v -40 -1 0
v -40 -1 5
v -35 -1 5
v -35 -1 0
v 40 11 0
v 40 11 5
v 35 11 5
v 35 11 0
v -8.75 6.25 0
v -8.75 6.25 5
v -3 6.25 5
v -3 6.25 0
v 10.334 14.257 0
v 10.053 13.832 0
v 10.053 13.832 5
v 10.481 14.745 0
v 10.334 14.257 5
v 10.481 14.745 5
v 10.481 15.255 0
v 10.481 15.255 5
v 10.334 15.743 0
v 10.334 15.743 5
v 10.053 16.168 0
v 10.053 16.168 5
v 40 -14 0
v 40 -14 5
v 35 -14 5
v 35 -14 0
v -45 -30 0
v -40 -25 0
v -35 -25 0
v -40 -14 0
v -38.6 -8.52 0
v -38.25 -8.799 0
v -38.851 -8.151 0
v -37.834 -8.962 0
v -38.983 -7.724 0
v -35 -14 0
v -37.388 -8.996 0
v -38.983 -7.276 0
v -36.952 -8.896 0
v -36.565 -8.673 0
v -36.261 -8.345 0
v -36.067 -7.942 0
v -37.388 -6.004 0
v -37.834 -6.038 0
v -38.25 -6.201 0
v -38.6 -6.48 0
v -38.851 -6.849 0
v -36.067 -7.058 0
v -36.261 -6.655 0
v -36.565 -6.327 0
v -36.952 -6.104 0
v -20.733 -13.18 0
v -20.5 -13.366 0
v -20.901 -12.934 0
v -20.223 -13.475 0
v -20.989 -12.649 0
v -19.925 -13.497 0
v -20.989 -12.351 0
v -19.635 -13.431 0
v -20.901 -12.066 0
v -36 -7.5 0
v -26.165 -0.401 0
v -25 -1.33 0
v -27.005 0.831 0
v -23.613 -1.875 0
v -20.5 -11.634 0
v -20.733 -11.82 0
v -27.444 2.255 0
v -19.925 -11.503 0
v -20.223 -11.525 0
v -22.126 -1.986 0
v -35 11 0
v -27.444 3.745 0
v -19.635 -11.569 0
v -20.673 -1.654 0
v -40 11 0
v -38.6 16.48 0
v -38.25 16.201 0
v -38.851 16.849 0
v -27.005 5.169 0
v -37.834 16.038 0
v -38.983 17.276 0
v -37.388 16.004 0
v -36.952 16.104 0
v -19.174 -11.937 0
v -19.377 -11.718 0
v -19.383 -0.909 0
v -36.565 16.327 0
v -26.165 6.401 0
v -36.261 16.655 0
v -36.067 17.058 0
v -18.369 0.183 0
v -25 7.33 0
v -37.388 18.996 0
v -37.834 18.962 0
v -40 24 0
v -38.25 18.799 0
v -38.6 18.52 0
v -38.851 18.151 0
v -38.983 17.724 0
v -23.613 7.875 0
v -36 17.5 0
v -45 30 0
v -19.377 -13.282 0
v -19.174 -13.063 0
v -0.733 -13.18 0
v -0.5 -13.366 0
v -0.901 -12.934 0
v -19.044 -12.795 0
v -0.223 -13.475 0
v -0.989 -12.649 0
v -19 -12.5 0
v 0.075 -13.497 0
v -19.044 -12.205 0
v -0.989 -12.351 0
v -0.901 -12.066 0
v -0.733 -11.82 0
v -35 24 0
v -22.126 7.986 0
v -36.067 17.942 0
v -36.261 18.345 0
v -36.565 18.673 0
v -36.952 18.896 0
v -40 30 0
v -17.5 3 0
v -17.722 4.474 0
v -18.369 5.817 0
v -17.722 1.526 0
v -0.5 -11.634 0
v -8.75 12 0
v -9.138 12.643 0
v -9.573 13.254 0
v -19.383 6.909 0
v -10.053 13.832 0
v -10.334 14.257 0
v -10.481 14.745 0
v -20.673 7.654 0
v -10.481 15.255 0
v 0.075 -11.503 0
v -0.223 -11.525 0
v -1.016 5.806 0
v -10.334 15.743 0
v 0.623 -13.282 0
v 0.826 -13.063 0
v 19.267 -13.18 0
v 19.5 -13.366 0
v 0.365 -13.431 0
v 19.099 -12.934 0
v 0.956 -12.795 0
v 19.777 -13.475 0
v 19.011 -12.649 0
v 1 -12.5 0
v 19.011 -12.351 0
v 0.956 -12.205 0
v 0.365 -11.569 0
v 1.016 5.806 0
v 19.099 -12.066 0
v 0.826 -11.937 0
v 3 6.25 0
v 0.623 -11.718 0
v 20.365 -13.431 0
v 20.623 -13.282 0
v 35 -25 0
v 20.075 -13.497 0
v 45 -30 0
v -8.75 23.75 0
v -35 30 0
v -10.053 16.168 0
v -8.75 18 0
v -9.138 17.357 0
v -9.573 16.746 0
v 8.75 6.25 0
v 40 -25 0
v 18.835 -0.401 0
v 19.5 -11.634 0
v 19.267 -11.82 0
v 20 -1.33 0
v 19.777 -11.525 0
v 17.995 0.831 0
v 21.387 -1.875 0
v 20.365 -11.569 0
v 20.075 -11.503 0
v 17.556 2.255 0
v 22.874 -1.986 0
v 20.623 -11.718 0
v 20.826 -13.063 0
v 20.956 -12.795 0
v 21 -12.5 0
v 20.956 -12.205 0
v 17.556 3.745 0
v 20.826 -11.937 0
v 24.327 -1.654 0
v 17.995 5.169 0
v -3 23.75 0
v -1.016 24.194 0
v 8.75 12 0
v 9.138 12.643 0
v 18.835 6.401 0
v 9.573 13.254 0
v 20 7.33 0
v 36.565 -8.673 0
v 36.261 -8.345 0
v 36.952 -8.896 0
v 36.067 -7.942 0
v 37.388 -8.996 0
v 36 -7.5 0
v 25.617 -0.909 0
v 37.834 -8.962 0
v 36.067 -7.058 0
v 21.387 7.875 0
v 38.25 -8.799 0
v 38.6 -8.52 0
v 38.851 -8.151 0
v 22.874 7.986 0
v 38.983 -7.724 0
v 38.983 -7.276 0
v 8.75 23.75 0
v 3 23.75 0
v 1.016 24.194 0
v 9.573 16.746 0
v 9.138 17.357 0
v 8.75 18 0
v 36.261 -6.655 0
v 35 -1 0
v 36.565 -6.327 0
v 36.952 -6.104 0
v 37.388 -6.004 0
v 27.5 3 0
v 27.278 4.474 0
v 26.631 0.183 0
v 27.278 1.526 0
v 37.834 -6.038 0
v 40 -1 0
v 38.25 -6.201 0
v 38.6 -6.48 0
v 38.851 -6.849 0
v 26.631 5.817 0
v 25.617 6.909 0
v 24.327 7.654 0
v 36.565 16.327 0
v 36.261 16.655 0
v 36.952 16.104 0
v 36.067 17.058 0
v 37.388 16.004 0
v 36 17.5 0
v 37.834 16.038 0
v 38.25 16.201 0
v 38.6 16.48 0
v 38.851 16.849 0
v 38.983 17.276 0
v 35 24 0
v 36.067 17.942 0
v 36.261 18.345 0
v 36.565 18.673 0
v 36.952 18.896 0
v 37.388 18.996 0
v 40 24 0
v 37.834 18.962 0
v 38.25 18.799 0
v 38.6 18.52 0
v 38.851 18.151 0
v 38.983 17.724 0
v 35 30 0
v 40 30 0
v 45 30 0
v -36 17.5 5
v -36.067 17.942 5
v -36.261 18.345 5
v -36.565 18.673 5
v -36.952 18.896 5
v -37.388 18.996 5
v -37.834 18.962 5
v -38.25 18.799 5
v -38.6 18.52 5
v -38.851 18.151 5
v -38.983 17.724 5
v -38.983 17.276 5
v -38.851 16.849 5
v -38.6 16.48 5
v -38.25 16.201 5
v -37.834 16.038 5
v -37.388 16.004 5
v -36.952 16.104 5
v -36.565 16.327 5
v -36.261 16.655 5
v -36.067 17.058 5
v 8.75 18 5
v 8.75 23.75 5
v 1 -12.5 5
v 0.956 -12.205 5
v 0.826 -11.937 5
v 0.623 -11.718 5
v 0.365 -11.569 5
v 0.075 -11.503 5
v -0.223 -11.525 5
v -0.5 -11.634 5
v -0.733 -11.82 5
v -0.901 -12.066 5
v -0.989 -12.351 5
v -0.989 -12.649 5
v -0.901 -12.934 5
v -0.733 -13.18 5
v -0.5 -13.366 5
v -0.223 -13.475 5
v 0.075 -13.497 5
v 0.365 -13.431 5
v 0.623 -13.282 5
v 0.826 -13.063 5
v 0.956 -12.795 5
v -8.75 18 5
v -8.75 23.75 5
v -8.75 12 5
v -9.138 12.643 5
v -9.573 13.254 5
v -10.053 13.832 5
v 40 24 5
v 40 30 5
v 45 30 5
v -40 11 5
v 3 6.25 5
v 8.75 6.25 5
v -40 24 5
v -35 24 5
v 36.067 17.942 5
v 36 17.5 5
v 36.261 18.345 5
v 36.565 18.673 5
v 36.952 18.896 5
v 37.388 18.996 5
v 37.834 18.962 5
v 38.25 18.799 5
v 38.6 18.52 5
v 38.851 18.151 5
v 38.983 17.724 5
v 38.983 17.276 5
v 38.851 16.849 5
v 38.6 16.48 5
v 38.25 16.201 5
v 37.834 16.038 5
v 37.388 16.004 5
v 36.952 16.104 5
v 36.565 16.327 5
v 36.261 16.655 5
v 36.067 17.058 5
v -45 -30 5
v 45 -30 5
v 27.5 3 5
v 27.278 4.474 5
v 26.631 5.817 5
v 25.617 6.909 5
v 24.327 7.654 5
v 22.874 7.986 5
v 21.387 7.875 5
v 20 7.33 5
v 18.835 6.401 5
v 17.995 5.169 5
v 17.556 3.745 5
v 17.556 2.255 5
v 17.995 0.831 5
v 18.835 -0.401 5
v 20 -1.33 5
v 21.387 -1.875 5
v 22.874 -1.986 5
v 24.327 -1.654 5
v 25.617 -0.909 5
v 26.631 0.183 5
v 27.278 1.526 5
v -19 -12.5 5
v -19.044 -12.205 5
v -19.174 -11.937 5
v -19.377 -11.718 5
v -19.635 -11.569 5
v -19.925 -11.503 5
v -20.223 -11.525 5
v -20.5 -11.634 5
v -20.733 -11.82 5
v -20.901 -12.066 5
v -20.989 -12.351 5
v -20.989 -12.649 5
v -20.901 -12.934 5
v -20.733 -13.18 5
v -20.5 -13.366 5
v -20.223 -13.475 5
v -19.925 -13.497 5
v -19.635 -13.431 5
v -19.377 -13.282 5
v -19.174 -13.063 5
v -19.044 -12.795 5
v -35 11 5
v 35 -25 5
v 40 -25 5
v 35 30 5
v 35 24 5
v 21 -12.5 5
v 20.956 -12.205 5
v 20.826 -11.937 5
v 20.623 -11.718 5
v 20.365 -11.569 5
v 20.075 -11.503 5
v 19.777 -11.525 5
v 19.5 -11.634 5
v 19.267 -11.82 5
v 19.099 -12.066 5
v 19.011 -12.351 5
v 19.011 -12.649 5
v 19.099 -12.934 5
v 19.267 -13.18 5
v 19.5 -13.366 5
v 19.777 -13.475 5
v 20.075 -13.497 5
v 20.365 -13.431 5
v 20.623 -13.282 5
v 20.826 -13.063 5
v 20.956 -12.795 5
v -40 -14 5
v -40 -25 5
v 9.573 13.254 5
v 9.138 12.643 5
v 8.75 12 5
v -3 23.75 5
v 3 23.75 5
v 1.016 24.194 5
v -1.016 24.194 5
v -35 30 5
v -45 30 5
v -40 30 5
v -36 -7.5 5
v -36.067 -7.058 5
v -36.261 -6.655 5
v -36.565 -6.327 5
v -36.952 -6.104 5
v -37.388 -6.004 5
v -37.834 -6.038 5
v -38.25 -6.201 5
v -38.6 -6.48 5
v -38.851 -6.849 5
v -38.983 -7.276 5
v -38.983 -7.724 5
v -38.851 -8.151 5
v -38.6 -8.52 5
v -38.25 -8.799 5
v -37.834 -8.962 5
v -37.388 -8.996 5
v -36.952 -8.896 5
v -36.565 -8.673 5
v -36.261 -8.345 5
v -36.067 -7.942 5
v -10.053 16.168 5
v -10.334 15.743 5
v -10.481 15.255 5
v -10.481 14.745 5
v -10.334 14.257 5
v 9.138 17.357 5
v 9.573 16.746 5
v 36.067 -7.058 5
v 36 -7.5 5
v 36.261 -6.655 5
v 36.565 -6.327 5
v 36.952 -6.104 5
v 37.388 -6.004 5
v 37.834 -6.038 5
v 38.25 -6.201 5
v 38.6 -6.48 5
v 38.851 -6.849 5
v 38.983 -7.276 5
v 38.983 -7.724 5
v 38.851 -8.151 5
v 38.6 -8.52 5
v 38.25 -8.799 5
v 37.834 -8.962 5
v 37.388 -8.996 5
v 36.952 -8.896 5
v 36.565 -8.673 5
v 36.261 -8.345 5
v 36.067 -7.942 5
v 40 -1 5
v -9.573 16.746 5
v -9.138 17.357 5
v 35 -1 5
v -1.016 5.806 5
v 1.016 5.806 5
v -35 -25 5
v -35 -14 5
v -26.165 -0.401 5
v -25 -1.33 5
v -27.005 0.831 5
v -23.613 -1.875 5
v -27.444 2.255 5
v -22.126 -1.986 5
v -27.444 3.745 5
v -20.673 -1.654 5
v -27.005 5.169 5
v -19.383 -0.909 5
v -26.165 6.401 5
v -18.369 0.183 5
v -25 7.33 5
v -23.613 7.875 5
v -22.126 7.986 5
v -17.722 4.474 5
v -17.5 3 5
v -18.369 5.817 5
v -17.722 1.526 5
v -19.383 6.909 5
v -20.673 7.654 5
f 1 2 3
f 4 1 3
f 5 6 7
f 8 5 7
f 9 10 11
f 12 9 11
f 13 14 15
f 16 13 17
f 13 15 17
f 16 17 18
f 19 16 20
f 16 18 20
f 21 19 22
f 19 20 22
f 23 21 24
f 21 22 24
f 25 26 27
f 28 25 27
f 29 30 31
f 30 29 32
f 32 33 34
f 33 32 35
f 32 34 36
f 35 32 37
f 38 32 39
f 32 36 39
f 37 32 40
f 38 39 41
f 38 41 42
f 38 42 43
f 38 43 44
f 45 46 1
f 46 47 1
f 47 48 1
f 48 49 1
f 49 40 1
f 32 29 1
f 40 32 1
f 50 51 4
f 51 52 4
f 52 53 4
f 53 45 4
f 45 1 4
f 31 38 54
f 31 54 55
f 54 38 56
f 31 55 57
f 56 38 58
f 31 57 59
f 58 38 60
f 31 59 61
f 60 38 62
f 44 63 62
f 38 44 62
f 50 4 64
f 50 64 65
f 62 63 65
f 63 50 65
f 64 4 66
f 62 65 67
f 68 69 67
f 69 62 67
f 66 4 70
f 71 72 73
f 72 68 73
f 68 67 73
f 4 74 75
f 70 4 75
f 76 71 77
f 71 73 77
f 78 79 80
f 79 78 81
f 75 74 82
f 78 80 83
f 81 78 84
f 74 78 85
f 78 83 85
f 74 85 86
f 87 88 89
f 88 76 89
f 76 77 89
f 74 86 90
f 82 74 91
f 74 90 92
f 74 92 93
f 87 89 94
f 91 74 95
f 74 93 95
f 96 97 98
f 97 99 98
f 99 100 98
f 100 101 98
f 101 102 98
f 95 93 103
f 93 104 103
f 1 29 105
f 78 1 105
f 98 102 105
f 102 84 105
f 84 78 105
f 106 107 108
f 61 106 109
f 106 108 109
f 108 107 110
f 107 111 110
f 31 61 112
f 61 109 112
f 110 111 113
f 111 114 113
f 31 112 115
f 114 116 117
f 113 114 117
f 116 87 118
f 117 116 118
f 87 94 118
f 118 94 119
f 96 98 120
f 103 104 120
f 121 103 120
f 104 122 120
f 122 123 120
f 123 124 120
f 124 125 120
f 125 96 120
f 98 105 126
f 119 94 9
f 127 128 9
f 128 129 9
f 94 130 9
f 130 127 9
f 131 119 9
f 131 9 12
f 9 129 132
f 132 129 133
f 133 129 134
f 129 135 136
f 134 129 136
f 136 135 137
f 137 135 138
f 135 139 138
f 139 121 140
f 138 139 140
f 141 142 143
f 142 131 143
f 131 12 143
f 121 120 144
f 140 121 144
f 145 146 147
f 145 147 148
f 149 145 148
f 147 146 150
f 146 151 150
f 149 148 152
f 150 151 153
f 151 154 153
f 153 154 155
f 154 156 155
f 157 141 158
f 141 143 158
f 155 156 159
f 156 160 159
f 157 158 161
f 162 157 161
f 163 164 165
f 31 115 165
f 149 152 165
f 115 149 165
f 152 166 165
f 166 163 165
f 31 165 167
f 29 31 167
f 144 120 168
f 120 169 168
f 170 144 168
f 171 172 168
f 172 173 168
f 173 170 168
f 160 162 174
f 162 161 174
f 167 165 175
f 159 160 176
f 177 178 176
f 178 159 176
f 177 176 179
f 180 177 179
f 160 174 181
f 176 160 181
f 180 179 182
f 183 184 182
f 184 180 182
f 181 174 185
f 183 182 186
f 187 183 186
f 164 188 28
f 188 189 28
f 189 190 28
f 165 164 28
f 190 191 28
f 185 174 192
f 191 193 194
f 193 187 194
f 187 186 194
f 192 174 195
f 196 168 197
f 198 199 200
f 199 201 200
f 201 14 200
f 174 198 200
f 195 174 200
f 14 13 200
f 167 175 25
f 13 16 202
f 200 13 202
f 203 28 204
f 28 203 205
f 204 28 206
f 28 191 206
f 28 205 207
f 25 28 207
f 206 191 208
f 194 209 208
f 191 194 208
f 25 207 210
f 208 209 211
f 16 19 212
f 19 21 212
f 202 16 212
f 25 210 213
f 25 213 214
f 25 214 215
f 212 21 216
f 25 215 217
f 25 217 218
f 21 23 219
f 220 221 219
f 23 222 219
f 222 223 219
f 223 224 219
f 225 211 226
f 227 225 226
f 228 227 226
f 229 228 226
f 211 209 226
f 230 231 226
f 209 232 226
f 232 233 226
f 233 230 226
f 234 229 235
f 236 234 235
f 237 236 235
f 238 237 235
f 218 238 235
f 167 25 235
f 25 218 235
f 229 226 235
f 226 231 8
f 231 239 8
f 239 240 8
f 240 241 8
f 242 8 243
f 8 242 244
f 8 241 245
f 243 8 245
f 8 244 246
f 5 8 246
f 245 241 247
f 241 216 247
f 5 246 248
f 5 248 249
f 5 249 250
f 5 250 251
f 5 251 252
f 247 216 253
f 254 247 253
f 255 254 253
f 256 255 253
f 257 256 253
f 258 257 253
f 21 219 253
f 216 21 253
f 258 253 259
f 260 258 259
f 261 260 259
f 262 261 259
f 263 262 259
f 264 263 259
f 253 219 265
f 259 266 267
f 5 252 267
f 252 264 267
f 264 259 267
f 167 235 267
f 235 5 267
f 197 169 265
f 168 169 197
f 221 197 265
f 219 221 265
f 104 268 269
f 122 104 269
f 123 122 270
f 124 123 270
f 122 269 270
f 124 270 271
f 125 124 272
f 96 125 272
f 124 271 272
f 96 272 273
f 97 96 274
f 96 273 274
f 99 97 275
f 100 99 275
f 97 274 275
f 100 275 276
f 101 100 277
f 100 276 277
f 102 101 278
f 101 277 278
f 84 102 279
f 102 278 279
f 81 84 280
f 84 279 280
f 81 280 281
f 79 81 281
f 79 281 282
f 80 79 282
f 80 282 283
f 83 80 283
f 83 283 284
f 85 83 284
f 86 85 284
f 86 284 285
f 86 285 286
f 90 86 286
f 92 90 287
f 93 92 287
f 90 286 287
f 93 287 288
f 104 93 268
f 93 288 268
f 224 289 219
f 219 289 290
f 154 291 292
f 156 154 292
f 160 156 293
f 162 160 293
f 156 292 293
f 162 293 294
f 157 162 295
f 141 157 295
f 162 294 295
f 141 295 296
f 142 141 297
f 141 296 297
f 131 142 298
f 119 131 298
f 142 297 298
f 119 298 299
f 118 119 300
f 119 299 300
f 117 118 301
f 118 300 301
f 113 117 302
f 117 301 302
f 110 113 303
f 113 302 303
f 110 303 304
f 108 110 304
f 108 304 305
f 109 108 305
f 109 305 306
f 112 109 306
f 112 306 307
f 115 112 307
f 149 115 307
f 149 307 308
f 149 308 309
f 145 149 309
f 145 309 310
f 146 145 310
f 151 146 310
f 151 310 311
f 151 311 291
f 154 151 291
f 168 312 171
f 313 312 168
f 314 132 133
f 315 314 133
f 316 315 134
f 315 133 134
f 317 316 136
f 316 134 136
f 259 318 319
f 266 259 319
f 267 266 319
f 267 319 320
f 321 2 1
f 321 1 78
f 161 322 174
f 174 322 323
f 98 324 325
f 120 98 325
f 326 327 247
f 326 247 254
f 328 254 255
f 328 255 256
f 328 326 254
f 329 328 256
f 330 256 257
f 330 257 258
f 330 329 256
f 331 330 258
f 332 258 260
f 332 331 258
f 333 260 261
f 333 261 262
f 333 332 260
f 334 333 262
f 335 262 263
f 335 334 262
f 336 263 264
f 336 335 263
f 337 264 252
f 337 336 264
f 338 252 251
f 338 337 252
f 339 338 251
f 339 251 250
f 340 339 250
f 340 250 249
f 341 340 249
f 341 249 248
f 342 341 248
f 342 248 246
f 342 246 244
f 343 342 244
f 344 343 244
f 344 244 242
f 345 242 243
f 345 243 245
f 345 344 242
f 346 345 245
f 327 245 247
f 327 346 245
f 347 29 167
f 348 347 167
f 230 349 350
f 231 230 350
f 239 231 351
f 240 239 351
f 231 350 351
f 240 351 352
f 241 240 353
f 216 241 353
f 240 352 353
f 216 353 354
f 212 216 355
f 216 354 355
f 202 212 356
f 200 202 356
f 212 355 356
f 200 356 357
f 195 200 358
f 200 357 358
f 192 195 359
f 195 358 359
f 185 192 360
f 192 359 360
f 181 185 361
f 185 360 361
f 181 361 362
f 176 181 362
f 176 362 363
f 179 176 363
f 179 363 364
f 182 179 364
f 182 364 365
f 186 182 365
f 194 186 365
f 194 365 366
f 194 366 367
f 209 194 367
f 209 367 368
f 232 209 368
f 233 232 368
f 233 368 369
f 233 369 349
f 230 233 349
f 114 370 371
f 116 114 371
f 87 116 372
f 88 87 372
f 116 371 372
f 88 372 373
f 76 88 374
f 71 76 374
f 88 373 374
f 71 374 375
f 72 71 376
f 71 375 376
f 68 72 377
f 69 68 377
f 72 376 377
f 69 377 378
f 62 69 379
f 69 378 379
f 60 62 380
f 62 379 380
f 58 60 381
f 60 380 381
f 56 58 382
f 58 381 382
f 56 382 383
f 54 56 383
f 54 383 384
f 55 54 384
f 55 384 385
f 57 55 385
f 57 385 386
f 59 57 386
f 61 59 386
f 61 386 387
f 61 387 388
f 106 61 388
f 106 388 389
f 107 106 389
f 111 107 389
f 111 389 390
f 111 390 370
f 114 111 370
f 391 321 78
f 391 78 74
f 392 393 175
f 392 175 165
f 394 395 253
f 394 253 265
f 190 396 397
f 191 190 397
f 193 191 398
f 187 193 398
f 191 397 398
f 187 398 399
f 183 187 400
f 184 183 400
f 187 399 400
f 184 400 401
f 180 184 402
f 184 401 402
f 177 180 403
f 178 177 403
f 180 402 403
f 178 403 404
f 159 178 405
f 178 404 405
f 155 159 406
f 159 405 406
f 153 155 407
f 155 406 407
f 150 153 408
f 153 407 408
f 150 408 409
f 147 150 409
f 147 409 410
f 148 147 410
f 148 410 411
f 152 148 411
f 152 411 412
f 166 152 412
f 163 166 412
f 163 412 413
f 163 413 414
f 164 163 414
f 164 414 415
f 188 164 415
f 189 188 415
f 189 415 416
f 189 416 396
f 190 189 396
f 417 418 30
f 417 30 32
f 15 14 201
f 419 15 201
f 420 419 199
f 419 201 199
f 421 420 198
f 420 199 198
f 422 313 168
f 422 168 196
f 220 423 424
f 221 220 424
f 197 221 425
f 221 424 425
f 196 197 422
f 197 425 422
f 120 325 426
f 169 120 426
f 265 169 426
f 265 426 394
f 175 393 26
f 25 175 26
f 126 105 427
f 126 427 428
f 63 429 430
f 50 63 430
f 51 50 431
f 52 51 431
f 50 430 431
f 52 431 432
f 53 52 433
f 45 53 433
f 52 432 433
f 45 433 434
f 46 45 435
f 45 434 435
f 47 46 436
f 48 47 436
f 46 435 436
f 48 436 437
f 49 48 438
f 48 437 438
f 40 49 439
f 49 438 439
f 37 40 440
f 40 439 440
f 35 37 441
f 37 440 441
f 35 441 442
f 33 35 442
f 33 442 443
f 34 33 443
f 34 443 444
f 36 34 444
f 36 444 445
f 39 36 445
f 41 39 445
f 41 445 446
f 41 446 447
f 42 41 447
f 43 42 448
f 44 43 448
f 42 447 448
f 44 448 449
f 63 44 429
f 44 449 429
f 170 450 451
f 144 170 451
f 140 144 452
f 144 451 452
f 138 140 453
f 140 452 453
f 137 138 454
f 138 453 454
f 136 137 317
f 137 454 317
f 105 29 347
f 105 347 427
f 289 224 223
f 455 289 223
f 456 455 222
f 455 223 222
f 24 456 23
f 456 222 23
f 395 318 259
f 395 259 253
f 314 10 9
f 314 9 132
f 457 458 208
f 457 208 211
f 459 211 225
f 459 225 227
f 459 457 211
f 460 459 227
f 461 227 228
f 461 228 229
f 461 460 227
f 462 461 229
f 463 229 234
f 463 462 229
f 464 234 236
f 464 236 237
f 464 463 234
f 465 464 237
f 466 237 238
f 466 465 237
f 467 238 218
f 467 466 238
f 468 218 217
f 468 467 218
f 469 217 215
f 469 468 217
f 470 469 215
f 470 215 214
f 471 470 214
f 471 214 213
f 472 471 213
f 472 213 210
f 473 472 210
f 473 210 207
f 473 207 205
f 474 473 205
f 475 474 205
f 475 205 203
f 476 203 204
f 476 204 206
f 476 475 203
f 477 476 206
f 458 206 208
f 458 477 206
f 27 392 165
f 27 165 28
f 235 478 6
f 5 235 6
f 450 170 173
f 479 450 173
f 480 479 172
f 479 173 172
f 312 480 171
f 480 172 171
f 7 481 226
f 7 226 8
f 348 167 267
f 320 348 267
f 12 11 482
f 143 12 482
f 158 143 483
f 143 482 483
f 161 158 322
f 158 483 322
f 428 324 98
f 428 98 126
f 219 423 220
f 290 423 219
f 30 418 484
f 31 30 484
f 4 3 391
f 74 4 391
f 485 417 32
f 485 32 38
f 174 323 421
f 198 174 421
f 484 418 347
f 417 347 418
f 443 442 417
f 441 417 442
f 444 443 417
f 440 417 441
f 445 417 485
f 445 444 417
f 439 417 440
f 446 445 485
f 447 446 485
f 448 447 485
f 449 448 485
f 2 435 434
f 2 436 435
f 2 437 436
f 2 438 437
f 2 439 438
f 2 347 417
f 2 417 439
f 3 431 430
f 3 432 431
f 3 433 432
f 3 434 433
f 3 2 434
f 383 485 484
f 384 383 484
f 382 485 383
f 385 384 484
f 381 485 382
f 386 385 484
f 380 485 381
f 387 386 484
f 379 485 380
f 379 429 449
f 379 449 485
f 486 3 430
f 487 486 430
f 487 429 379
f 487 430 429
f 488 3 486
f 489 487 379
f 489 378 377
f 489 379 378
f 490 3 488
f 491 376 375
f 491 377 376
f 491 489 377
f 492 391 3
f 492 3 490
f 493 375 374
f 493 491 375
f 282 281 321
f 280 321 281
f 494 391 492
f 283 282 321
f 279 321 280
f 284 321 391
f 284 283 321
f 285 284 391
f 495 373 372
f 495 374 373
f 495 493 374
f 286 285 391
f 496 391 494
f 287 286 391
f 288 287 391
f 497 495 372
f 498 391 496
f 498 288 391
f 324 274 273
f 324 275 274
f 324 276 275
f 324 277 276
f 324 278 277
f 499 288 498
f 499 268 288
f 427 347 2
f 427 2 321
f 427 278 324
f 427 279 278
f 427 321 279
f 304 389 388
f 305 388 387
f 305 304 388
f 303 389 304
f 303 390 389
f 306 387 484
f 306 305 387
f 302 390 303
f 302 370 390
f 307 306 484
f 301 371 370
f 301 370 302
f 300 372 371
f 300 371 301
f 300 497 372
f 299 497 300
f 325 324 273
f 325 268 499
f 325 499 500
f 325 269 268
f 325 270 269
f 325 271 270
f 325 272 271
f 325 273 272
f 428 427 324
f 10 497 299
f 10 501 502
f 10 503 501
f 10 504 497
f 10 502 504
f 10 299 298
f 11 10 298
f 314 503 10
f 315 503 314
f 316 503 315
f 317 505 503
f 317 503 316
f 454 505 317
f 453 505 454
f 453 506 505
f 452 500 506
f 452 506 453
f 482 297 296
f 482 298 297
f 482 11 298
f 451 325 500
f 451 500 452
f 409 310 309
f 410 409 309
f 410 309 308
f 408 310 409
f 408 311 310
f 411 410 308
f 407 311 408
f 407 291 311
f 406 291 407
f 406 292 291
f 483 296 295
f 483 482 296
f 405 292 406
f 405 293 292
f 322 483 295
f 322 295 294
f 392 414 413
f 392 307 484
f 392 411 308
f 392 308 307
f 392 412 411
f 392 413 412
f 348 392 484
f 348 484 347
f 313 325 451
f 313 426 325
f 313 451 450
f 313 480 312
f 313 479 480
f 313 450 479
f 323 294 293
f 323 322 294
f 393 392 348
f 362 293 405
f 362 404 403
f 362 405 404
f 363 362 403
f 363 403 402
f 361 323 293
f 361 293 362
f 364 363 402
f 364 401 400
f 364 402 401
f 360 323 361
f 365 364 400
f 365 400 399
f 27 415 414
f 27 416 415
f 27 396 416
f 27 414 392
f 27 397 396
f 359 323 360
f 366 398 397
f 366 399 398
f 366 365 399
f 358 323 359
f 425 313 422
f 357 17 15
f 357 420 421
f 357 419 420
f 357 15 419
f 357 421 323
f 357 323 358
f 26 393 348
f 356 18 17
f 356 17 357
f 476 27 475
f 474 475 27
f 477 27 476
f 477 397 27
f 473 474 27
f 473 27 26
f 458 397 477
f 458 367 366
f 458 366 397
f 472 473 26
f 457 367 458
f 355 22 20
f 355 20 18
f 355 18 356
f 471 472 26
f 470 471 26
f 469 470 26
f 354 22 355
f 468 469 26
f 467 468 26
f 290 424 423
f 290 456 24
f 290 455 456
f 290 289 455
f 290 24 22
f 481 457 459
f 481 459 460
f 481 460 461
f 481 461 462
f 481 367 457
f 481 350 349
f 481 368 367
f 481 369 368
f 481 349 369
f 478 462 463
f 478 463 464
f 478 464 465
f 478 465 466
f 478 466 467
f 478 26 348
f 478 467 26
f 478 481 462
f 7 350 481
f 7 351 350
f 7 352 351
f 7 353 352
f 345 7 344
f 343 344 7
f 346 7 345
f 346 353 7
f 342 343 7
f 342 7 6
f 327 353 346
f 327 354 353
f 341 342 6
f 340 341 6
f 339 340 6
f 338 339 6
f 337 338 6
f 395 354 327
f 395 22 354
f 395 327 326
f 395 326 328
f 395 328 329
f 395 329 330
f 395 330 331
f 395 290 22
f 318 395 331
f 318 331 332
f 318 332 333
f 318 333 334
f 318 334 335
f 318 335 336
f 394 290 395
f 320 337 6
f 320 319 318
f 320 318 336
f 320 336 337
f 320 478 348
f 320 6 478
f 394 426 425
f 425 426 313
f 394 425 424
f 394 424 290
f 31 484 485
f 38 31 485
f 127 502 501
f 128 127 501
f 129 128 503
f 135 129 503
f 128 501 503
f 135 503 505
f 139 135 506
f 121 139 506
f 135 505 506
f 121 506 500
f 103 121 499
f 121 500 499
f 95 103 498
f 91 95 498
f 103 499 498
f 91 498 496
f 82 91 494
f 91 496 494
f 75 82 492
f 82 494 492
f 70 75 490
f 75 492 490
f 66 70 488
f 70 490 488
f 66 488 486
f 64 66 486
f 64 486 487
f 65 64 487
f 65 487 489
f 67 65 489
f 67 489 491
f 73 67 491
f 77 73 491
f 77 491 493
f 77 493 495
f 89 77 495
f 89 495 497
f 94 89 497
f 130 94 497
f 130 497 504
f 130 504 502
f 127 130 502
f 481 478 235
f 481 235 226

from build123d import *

# Parameters (mm, degrees)
SKETCH1_W           = 90
SKETCH1_H           = 60
BOSS_EXTRUDE1_DEPTH = 5
SKETCH3_R           = 9.25
CUT_EXTRUDE2_DEPTH  = 5
SKETCH4_W           = 17.5
SKETCH4_H           = 17.5
CUT_EXTRUDE3_DEPTH  = 5
SKETCH5_R           = 1.75
CUT_EXTRUDE4_DEPTH  = 5
SKETCH6_R           = 5
SKETCH6_R_2         = 1
CUT_EXTRUDE5_DEPTH  = 10
FILLET1_R           = 10
SKETCH7_W           = 5
SKETCH7_H           = 11
SKETCH7_H_2         = 12
SKETCH7_R           = 1.5
CUT_EXTRUDE6_DEPTH  = 5


with BuildPart() as part:
    # Sketch1 → Boss-Extrude1 (new body)
    with BuildSketch(Plane.XY):
        Rectangle(SKETCH1_W, SKETCH1_H)
    extrude(amount=BOSS_EXTRUDE1_DEPTH)

    # Sketch3 → Cut-Extrude2 (cut)
    with BuildSketch(Plane.XY.offset(5)):
        with Locations((0, 15)):
            Circle(SKETCH3_R)
    extrude(amount=-CUT_EXTRUDE2_DEPTH, mode=Mode.SUBTRACT)

    # Sketch4 → Cut-Extrude3 (cut)
    with BuildSketch(Plane.XY.offset(5)):
        with Locations((0, 15)):
            Rectangle(SKETCH4_W, SKETCH4_H)
    extrude(amount=-CUT_EXTRUDE3_DEPTH, mode=Mode.SUBTRACT)

    # Sketch5 → Cut-Extrude4 (cut)
    with BuildSketch(Plane.XY.offset(5)):
        with Locations((-8.75, 15)):
            Circle(SKETCH5_R)
        with Locations((8.75, 15)):
            Circle(SKETCH5_R)
    extrude(amount=-CUT_EXTRUDE4_DEPTH, mode=Mode.SUBTRACT)

    # Sketch6 → Cut-Extrude5 (cut)
    with BuildSketch(Plane.XY.offset(5)):
        with Locations((-22.5, 3)):
            Circle(SKETCH6_R)
        with Locations((22.5, 3)):
            Circle(SKETCH6_R)
        with Locations((-20, -12.5)):
            Circle(SKETCH6_R_2)
        with Locations((0, -12.5)):
            Circle(SKETCH6_R_2)
        with Locations((20, -12.5)):
            Circle(SKETCH6_R_2)
    extrude(amount=-CUT_EXTRUDE5_DEPTH, mode=Mode.SUBTRACT)

    # Fillet1
    # the kernel refuses this fillet: 10 mm, written as the material it takes off along each edge
    with BuildSketch(Plane(origin=(9.089285714, 13.283204962, -3.318254218), x_dir=(0.8690606948283255, 0.4947054767278286, 0), z_dir=(0, 0, 1))) as fillet1_piece_1:
        with BuildLine():
            CenterArc((4.277170512, -9.484831943), FILLET1_R, 108.471170307, 12.906966453)
            Line((-0.929668401, -0.947336494), (-1.033805179, -0.776586585))
            ThreePointArc((-1.033805179, -0.776586585), (-0.590566588, -0.350280804), (-0.152428823, 0.129481481))
            Line((-0.152428823, 0.129481481), (0.063365489, 0.189696639))
            ThreePointArc((0.063365489, 0.189696639), (0.554448029, 0.10984559), (1.04553057, 0.189696639))
            Line((1.04553057, 0.189696639), (1.108896059, 0))
        make_face()
    extrude(amount=11.636508437, mode=Mode.SUBTRACT)
    with BuildSketch(Plane(origin=(9.089285714, 16.716795038, -3.318254218), x_dir=(-0.255620645644957, 0.9667771643559105, 0), z_dir=(0, 0, 1))) as fillet1_piece_2:
        with BuildLine():
            CenterArc((3.77380457, -9.696113842), FILLET1_R, 104.1611678, 12.906966453)
            Line((-0.776692771, -0.791453605), (-0.867702718, -0.6133604))
            ThreePointArc((-0.867702718, -0.6133604), (-0.466746599, -0.318788775), (-0.179774835, 0.087641364))
            Line((-0.179774835, 0.087641364), (0.014349207, 0.199484586))
            ThreePointArc((0.014349207, 0.199484586), (0.663650844, 0.176162125), (1.27837163, 0.193922277))
            Line((1.27837163, 0.193922277), (1.327301687, 0))
        make_face()
    extrude(amount=11.636508437, mode=Mode.SUBTRACT)
    with BuildSketch(Plane(origin=(-9.089285714, 16.716795038, -3.318254218), x_dir=(0.25562064564495884, 0.9667771643559101, 0), z_dir=(0, 0, 1))) as fillet1_piece_3:
        with BuildLine():
            CenterArc((3.77380457, 9.696113842), FILLET1_R, 242.931865747, 12.906966453)
            Line((-0.776692771, 0.791453605), (-0.867702718, 0.6133604))
            ThreePointArc((-0.867702718, 0.6133604), (-0.466746599, 0.318788775), (-0.179774835, -0.087641364))
            Line((-0.179774835, -0.087641364), (0.014349207, -0.199484586))
            ThreePointArc((0.014349207, -0.199484586), (0.663650844, -0.176162125), (1.27837163, -0.193922277))
            Line((1.27837163, -0.193922277), (1.327301687, 0))
        make_face()
    extrude(amount=11.636508437, mode=Mode.SUBTRACT)
    with BuildSketch(Plane(origin=(-9.089285714, 13.283204962, -3.318254218), x_dir=(-0.8690606948283244, 0.4947054767278305, 0), z_dir=(0, 0, 1))) as fillet1_piece_4:
        with BuildLine():
            CenterArc((4.277170512, 9.484831943), FILLET1_R, 238.62186324, 12.906966453)
            Line((-0.929668401, 0.947336494), (-1.033805179, 0.776586585))
            ThreePointArc((-1.033805179, 0.776586585), (-0.590566588, 0.350280804), (-0.152428823, -0.129481481))
            Line((-0.152428823, -0.129481481), (0.063365489, -0.189696639))
            ThreePointArc((0.063365489, -0.189696639), (0.554448029, -0.10984559), (1.04553057, -0.189696639))
            Line((1.04553057, -0.189696639), (1.108896059, 0))
        make_face()
    extrude(amount=11.636508437, mode=Mode.SUBTRACT)

    # Sketch7 → Cut-Extrude6 (cut)
    with BuildSketch(Plane.XY.offset(5)):
        with Locations((-37.5, 29.5)):
            Rectangle(SKETCH7_W, SKETCH7_H)
        with Locations((-37.5, 5)):
            Rectangle(SKETCH7_W, SKETCH7_H_2)
        with Locations((-37.5, -19.5)):
            Rectangle(SKETCH7_W, SKETCH7_H)
        with Locations((-37.5, 17.5)):
            Circle(SKETCH7_R)
        with Locations((-37.5, -7.5)):
            Circle(SKETCH7_R)
    cut_extrude6 = extrude(amount=-CUT_EXTRUDE6_DEPTH, mode=Mode.SUBTRACT)

    # Mirror1: Cut-Extrude6 across plane
    add(cut_extrude6.mirror(Plane(origin=(0, 0, 0), x_dir=(0, 0, 1), z_dir=(1, 0, 0))), mode=Mode.SUBTRACT)


solid = part.part
